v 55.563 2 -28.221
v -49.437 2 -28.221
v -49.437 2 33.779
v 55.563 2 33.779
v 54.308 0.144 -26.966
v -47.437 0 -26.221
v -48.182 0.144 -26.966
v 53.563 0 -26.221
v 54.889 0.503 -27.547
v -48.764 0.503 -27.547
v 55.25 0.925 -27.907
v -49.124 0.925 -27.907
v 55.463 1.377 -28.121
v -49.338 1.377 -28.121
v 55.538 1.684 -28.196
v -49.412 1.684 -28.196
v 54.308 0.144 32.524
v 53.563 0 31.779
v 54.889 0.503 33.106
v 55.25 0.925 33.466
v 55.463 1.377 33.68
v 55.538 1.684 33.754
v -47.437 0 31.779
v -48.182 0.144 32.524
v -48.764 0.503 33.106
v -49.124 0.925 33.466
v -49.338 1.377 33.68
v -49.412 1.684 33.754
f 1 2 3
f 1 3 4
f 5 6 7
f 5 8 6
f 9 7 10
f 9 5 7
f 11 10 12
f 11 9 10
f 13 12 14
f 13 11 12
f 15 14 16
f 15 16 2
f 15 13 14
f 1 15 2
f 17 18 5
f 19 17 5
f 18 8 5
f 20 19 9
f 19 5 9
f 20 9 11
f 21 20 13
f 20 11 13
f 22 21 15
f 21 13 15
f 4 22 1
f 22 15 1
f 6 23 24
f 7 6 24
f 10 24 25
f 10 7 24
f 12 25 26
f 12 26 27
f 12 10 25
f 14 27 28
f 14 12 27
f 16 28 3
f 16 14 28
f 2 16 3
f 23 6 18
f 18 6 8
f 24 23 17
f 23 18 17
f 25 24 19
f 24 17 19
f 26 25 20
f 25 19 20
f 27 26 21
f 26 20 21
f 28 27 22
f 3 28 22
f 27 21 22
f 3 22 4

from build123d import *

# Parameters (mm, degrees)
SKETCH1_W           = 104.999999998
SKETCH1_H           = 61.999999997
SKETCH1_W_2         = 102
SKETCH1_H_2         = 59
BOSS_EXTRUDE1_DEPTH = 2
SKETCH1_2_W         = 102
SKETCH1_2_H         = 59
BOSS_EXTRUDE2_DEPTH = 2
FILLET1_R           = 2


with BuildPart() as part:
    # Sketch1 → Boss-Extrude1 (new body)
    with BuildSketch(Plane(origin=(0, 0, 0), x_dir=(1, 0, 0), z_dir=(0, 1, 0))):
        with Locations((3.062796012, -2.779331445)):
            Rectangle(SKETCH1_W, SKETCH1_H)
        with Locations((3.062796013, -2.779331447)):
            Rectangle(SKETCH1_W_2, SKETCH1_H_2, mode=Mode.SUBTRACT)
    extrude(amount=BOSS_EXTRUDE1_DEPTH)

    # Sketch1<2> → Boss-Extrude2 (add)
    with BuildSketch(Plane(origin=(0, 0, 0), x_dir=(1, 0, 0), z_dir=(0, 1, 0))):
        with Locations((3.062796013, -2.779331447)):
            Rectangle(SKETCH1_2_W, SKETCH1_2_H)
    extrude(amount=BOSS_EXTRUDE2_DEPTH)

    # Fillet1
    fillet1_edges = [part.edges().sort_by_distance(p)[0] for p in [
        (3.062796012, 0, 33.779331444),
        (55.562796011, 0, 2.779331445),
        (3.062796012, 0, -28.220668553),
        (-49.437203987, 0, 2.779331445),
    ]]
    fillet(fillet1_edges, radius=FILLET1_R - 0.0001)  # a hair under: the kernel refuses the full size


solid = part.part
